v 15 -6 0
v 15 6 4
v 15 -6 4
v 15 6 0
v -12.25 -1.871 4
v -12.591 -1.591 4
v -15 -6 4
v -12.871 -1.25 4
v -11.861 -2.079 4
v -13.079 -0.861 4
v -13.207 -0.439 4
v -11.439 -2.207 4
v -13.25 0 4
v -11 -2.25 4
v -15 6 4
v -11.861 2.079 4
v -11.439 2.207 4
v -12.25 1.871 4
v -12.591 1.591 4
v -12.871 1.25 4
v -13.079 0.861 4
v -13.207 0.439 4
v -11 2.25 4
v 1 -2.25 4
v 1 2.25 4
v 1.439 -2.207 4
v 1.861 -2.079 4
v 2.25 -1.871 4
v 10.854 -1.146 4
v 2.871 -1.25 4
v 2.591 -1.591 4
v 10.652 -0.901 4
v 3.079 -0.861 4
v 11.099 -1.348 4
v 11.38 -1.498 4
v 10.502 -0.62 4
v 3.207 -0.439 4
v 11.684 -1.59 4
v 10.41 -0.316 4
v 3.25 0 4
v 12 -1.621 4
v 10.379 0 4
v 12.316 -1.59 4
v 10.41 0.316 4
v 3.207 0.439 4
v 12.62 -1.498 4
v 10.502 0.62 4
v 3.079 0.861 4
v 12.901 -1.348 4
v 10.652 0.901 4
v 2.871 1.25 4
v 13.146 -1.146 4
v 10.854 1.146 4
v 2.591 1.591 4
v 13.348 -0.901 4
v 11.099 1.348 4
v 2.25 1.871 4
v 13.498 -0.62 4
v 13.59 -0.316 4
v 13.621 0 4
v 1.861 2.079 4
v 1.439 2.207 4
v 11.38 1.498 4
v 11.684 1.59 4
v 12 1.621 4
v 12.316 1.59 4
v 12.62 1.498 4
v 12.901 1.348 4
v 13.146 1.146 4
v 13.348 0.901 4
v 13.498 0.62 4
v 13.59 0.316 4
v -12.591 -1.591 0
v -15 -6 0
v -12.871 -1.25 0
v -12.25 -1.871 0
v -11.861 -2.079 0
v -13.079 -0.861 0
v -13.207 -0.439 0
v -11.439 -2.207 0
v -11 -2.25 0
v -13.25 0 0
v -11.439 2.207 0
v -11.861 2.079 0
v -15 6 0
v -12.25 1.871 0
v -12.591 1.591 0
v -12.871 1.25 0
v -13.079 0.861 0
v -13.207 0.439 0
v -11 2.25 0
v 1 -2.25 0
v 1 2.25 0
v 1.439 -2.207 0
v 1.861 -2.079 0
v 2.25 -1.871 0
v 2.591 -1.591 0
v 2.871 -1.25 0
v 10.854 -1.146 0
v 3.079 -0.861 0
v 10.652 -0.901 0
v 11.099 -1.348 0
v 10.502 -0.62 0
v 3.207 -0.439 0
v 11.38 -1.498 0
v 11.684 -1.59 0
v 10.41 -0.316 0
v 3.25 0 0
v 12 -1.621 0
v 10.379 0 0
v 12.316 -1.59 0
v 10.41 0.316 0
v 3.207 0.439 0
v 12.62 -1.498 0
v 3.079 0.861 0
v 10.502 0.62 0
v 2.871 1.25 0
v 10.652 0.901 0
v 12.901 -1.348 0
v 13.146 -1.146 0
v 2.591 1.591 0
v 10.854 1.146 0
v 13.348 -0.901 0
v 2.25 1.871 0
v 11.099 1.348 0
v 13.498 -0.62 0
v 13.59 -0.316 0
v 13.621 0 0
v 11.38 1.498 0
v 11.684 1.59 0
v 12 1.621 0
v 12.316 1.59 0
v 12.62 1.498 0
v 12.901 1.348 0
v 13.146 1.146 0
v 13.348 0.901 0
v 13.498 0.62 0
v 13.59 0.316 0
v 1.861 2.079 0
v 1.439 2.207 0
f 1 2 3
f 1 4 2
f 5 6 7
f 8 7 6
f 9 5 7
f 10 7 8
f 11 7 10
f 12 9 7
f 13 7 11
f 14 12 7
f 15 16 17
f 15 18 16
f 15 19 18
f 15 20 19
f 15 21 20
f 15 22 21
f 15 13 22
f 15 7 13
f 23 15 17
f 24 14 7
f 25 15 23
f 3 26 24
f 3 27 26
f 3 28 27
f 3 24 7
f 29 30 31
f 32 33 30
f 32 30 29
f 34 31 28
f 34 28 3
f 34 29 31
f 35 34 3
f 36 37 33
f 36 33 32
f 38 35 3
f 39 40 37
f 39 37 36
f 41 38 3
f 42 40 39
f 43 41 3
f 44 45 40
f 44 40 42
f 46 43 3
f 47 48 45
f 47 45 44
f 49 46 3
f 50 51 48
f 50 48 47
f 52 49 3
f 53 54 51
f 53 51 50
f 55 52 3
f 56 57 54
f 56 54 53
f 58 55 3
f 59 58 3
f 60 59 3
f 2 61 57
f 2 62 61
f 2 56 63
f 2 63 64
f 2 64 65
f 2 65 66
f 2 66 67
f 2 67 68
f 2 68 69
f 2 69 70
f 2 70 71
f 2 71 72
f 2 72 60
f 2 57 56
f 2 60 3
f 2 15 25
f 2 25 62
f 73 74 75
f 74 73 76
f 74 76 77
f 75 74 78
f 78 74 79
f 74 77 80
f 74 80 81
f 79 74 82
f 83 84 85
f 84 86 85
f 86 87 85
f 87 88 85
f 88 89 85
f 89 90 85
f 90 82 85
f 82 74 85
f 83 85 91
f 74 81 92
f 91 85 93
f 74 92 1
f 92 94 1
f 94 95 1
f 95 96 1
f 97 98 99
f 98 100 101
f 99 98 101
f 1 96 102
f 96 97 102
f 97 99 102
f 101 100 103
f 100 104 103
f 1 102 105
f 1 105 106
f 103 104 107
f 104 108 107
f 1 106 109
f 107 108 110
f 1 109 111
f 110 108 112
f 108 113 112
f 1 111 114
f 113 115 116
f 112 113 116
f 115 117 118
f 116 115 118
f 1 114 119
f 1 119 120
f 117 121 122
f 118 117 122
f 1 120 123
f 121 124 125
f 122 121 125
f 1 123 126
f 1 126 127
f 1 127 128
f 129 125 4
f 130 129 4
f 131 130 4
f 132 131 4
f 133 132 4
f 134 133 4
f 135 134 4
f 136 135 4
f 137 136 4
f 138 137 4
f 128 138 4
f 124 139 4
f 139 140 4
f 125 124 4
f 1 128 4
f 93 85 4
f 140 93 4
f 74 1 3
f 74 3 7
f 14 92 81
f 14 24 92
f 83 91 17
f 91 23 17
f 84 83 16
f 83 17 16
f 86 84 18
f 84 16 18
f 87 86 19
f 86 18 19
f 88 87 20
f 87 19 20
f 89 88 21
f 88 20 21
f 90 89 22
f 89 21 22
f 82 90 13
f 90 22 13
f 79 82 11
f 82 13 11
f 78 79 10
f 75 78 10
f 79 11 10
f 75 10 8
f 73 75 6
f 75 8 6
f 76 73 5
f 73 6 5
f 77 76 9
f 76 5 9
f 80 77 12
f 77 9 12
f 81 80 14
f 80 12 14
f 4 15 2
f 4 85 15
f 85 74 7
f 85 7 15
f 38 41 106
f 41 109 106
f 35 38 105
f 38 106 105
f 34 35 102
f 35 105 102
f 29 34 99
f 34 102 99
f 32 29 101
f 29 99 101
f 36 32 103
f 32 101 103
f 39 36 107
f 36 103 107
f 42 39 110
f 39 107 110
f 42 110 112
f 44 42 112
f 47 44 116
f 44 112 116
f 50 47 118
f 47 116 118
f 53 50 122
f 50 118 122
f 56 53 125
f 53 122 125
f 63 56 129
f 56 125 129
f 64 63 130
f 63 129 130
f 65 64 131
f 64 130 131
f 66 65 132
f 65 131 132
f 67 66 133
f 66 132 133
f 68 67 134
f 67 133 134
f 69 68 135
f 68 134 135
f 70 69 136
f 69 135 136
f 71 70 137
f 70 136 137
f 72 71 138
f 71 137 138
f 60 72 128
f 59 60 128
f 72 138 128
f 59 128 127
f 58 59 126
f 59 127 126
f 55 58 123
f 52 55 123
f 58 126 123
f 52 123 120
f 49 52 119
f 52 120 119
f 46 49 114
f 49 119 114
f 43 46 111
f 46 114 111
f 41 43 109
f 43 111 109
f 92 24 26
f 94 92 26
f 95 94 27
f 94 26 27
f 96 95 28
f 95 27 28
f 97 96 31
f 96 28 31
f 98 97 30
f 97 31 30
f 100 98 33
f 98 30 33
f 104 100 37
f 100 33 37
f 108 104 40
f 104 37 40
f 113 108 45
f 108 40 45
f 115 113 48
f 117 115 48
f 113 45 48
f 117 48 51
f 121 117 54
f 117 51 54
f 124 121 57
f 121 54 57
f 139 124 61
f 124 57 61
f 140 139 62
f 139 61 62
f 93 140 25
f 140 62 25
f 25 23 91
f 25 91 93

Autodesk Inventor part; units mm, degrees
ref_plane "YZ Plane" through (0, 0, 0) normal (1, 0, 0) x (0, 1, 0)
ref_plane "XZ Plane" through (0, 0, 0) normal (0, 1, 0) x (-1, 0, 0)
ref_plane "XY Plane" through (0, 0, 0) normal (0, 0, 1) x (1, 0, 0)
sketch "Skizze1" plane through (0, 0, 0) normal (0, 0, 1) x (1, 0, 0)
  line L0 (-21, 0) -> (21, 0) projected
  line L1 (0, -8.4) -> (0, 8.4) projected
  line L2 (15, -6) -> (-15, -6)
  line L3 (-15, -6) -> (-15, 6)
  line L4 (-15, 6) -> (15, 6)
  line L5 (15, 6) -> (15, -6)
  line L6 (15, -6) -> (-15, 6) construction
  line L7 (-15, -6) -> (15, 6) construction
  point P0 (0, 0)
  dimension "d0" = 12
  dimension "d1" = 30
extrude "Extrusion1" add sketch "Skizze1" along normal blind 4
sketch "Skizze2" plane through (0, 0, 0) normal (0, 0, -1) x (-1, 0, 0)
  line L0 (15, -6) -> (-15, -6) projected
  line L1 (15, 6) -> (15, -6) projected
  line L2 (-15, 6) -> (15, 6) projected
  line L3 (21, 0) -> (-21, 0) projected
  line L4 (0, -8.4) -> (0, 8.4) projected
  point P0 (0, 0)
  point P1 (-1, 0)
  point P2 (11, 0)
  point P3 (15, 0)
  dimension "d5" = 4
  dimension "d6" = 16
hole "Bohrung1" at (1, 0, 0) at (-11, 0, 0) direction (0, 0, 1) diameter 4.5 end through all
sketch "Skizze3" plane through (0, 0, 4) normal (0, 0, 1) x (1, 0, 0)
  circle A0 centre (-11, 0) radius 2.25 projected
  circle A1 centre (1, 0) radius 2.25 projected
  line L0 (-15, -6) -> (15, -6) projected
  line L1 (15, -6) -> (15, 6) projected
  line L2 (15, 6) -> (-15, 6) projected
  line L3 (-15, 6) -> (-15, -6) projected
  line L4 (-21, 0) -> (21, 0) projected
  line L5 (0, -8.4) -> (0, 8.4) projected
  point P0 (0, 0)
  point P1 (12, 0)
  dimension "d14" = 3
hole "Bohrung2" at (12, 0, 4) direction (0, 0, -1) diameter 3.242 end through all thread size "M4x0.7" class "6H" standard "ISO Metric profile"
sketch "Skizze4" plane through (0, 0, 4) normal (0, 0, 1) x (1, 0, 0)
  circle A0 centre (12, 0) radius 1.621 projected
  circle A1 centre (-11, 0) radius 2.25 projected
  circle A2 centre (1, 0) radius 2.25 projected
  line L0 (-15, -6) -> (15, -6) projected
  line L1 (15, -6) -> (15, 6) projected
  line L2 (15, 6) -> (-15, 6) projected
  line L3 (-15, 6) -> (-15, -6) projected
  line L4 (-11, 2.25) -> (1, 2.25)
  line L5 (1, 2.25) -> (1, -2.25)
  line L6 (1, -2.25) -> (-11, -2.25)
  line L7 (-11, -2.25) -> (-11, 2.25)
  circle A3 centre (1, 0) radius 2.25 projected
  point P0 (0, 0)
extrude "Extrusion2" cut sketch "Skizze4" against normal through all contours A1 L4 A2 L6
properties part number "24_0497_0021"
